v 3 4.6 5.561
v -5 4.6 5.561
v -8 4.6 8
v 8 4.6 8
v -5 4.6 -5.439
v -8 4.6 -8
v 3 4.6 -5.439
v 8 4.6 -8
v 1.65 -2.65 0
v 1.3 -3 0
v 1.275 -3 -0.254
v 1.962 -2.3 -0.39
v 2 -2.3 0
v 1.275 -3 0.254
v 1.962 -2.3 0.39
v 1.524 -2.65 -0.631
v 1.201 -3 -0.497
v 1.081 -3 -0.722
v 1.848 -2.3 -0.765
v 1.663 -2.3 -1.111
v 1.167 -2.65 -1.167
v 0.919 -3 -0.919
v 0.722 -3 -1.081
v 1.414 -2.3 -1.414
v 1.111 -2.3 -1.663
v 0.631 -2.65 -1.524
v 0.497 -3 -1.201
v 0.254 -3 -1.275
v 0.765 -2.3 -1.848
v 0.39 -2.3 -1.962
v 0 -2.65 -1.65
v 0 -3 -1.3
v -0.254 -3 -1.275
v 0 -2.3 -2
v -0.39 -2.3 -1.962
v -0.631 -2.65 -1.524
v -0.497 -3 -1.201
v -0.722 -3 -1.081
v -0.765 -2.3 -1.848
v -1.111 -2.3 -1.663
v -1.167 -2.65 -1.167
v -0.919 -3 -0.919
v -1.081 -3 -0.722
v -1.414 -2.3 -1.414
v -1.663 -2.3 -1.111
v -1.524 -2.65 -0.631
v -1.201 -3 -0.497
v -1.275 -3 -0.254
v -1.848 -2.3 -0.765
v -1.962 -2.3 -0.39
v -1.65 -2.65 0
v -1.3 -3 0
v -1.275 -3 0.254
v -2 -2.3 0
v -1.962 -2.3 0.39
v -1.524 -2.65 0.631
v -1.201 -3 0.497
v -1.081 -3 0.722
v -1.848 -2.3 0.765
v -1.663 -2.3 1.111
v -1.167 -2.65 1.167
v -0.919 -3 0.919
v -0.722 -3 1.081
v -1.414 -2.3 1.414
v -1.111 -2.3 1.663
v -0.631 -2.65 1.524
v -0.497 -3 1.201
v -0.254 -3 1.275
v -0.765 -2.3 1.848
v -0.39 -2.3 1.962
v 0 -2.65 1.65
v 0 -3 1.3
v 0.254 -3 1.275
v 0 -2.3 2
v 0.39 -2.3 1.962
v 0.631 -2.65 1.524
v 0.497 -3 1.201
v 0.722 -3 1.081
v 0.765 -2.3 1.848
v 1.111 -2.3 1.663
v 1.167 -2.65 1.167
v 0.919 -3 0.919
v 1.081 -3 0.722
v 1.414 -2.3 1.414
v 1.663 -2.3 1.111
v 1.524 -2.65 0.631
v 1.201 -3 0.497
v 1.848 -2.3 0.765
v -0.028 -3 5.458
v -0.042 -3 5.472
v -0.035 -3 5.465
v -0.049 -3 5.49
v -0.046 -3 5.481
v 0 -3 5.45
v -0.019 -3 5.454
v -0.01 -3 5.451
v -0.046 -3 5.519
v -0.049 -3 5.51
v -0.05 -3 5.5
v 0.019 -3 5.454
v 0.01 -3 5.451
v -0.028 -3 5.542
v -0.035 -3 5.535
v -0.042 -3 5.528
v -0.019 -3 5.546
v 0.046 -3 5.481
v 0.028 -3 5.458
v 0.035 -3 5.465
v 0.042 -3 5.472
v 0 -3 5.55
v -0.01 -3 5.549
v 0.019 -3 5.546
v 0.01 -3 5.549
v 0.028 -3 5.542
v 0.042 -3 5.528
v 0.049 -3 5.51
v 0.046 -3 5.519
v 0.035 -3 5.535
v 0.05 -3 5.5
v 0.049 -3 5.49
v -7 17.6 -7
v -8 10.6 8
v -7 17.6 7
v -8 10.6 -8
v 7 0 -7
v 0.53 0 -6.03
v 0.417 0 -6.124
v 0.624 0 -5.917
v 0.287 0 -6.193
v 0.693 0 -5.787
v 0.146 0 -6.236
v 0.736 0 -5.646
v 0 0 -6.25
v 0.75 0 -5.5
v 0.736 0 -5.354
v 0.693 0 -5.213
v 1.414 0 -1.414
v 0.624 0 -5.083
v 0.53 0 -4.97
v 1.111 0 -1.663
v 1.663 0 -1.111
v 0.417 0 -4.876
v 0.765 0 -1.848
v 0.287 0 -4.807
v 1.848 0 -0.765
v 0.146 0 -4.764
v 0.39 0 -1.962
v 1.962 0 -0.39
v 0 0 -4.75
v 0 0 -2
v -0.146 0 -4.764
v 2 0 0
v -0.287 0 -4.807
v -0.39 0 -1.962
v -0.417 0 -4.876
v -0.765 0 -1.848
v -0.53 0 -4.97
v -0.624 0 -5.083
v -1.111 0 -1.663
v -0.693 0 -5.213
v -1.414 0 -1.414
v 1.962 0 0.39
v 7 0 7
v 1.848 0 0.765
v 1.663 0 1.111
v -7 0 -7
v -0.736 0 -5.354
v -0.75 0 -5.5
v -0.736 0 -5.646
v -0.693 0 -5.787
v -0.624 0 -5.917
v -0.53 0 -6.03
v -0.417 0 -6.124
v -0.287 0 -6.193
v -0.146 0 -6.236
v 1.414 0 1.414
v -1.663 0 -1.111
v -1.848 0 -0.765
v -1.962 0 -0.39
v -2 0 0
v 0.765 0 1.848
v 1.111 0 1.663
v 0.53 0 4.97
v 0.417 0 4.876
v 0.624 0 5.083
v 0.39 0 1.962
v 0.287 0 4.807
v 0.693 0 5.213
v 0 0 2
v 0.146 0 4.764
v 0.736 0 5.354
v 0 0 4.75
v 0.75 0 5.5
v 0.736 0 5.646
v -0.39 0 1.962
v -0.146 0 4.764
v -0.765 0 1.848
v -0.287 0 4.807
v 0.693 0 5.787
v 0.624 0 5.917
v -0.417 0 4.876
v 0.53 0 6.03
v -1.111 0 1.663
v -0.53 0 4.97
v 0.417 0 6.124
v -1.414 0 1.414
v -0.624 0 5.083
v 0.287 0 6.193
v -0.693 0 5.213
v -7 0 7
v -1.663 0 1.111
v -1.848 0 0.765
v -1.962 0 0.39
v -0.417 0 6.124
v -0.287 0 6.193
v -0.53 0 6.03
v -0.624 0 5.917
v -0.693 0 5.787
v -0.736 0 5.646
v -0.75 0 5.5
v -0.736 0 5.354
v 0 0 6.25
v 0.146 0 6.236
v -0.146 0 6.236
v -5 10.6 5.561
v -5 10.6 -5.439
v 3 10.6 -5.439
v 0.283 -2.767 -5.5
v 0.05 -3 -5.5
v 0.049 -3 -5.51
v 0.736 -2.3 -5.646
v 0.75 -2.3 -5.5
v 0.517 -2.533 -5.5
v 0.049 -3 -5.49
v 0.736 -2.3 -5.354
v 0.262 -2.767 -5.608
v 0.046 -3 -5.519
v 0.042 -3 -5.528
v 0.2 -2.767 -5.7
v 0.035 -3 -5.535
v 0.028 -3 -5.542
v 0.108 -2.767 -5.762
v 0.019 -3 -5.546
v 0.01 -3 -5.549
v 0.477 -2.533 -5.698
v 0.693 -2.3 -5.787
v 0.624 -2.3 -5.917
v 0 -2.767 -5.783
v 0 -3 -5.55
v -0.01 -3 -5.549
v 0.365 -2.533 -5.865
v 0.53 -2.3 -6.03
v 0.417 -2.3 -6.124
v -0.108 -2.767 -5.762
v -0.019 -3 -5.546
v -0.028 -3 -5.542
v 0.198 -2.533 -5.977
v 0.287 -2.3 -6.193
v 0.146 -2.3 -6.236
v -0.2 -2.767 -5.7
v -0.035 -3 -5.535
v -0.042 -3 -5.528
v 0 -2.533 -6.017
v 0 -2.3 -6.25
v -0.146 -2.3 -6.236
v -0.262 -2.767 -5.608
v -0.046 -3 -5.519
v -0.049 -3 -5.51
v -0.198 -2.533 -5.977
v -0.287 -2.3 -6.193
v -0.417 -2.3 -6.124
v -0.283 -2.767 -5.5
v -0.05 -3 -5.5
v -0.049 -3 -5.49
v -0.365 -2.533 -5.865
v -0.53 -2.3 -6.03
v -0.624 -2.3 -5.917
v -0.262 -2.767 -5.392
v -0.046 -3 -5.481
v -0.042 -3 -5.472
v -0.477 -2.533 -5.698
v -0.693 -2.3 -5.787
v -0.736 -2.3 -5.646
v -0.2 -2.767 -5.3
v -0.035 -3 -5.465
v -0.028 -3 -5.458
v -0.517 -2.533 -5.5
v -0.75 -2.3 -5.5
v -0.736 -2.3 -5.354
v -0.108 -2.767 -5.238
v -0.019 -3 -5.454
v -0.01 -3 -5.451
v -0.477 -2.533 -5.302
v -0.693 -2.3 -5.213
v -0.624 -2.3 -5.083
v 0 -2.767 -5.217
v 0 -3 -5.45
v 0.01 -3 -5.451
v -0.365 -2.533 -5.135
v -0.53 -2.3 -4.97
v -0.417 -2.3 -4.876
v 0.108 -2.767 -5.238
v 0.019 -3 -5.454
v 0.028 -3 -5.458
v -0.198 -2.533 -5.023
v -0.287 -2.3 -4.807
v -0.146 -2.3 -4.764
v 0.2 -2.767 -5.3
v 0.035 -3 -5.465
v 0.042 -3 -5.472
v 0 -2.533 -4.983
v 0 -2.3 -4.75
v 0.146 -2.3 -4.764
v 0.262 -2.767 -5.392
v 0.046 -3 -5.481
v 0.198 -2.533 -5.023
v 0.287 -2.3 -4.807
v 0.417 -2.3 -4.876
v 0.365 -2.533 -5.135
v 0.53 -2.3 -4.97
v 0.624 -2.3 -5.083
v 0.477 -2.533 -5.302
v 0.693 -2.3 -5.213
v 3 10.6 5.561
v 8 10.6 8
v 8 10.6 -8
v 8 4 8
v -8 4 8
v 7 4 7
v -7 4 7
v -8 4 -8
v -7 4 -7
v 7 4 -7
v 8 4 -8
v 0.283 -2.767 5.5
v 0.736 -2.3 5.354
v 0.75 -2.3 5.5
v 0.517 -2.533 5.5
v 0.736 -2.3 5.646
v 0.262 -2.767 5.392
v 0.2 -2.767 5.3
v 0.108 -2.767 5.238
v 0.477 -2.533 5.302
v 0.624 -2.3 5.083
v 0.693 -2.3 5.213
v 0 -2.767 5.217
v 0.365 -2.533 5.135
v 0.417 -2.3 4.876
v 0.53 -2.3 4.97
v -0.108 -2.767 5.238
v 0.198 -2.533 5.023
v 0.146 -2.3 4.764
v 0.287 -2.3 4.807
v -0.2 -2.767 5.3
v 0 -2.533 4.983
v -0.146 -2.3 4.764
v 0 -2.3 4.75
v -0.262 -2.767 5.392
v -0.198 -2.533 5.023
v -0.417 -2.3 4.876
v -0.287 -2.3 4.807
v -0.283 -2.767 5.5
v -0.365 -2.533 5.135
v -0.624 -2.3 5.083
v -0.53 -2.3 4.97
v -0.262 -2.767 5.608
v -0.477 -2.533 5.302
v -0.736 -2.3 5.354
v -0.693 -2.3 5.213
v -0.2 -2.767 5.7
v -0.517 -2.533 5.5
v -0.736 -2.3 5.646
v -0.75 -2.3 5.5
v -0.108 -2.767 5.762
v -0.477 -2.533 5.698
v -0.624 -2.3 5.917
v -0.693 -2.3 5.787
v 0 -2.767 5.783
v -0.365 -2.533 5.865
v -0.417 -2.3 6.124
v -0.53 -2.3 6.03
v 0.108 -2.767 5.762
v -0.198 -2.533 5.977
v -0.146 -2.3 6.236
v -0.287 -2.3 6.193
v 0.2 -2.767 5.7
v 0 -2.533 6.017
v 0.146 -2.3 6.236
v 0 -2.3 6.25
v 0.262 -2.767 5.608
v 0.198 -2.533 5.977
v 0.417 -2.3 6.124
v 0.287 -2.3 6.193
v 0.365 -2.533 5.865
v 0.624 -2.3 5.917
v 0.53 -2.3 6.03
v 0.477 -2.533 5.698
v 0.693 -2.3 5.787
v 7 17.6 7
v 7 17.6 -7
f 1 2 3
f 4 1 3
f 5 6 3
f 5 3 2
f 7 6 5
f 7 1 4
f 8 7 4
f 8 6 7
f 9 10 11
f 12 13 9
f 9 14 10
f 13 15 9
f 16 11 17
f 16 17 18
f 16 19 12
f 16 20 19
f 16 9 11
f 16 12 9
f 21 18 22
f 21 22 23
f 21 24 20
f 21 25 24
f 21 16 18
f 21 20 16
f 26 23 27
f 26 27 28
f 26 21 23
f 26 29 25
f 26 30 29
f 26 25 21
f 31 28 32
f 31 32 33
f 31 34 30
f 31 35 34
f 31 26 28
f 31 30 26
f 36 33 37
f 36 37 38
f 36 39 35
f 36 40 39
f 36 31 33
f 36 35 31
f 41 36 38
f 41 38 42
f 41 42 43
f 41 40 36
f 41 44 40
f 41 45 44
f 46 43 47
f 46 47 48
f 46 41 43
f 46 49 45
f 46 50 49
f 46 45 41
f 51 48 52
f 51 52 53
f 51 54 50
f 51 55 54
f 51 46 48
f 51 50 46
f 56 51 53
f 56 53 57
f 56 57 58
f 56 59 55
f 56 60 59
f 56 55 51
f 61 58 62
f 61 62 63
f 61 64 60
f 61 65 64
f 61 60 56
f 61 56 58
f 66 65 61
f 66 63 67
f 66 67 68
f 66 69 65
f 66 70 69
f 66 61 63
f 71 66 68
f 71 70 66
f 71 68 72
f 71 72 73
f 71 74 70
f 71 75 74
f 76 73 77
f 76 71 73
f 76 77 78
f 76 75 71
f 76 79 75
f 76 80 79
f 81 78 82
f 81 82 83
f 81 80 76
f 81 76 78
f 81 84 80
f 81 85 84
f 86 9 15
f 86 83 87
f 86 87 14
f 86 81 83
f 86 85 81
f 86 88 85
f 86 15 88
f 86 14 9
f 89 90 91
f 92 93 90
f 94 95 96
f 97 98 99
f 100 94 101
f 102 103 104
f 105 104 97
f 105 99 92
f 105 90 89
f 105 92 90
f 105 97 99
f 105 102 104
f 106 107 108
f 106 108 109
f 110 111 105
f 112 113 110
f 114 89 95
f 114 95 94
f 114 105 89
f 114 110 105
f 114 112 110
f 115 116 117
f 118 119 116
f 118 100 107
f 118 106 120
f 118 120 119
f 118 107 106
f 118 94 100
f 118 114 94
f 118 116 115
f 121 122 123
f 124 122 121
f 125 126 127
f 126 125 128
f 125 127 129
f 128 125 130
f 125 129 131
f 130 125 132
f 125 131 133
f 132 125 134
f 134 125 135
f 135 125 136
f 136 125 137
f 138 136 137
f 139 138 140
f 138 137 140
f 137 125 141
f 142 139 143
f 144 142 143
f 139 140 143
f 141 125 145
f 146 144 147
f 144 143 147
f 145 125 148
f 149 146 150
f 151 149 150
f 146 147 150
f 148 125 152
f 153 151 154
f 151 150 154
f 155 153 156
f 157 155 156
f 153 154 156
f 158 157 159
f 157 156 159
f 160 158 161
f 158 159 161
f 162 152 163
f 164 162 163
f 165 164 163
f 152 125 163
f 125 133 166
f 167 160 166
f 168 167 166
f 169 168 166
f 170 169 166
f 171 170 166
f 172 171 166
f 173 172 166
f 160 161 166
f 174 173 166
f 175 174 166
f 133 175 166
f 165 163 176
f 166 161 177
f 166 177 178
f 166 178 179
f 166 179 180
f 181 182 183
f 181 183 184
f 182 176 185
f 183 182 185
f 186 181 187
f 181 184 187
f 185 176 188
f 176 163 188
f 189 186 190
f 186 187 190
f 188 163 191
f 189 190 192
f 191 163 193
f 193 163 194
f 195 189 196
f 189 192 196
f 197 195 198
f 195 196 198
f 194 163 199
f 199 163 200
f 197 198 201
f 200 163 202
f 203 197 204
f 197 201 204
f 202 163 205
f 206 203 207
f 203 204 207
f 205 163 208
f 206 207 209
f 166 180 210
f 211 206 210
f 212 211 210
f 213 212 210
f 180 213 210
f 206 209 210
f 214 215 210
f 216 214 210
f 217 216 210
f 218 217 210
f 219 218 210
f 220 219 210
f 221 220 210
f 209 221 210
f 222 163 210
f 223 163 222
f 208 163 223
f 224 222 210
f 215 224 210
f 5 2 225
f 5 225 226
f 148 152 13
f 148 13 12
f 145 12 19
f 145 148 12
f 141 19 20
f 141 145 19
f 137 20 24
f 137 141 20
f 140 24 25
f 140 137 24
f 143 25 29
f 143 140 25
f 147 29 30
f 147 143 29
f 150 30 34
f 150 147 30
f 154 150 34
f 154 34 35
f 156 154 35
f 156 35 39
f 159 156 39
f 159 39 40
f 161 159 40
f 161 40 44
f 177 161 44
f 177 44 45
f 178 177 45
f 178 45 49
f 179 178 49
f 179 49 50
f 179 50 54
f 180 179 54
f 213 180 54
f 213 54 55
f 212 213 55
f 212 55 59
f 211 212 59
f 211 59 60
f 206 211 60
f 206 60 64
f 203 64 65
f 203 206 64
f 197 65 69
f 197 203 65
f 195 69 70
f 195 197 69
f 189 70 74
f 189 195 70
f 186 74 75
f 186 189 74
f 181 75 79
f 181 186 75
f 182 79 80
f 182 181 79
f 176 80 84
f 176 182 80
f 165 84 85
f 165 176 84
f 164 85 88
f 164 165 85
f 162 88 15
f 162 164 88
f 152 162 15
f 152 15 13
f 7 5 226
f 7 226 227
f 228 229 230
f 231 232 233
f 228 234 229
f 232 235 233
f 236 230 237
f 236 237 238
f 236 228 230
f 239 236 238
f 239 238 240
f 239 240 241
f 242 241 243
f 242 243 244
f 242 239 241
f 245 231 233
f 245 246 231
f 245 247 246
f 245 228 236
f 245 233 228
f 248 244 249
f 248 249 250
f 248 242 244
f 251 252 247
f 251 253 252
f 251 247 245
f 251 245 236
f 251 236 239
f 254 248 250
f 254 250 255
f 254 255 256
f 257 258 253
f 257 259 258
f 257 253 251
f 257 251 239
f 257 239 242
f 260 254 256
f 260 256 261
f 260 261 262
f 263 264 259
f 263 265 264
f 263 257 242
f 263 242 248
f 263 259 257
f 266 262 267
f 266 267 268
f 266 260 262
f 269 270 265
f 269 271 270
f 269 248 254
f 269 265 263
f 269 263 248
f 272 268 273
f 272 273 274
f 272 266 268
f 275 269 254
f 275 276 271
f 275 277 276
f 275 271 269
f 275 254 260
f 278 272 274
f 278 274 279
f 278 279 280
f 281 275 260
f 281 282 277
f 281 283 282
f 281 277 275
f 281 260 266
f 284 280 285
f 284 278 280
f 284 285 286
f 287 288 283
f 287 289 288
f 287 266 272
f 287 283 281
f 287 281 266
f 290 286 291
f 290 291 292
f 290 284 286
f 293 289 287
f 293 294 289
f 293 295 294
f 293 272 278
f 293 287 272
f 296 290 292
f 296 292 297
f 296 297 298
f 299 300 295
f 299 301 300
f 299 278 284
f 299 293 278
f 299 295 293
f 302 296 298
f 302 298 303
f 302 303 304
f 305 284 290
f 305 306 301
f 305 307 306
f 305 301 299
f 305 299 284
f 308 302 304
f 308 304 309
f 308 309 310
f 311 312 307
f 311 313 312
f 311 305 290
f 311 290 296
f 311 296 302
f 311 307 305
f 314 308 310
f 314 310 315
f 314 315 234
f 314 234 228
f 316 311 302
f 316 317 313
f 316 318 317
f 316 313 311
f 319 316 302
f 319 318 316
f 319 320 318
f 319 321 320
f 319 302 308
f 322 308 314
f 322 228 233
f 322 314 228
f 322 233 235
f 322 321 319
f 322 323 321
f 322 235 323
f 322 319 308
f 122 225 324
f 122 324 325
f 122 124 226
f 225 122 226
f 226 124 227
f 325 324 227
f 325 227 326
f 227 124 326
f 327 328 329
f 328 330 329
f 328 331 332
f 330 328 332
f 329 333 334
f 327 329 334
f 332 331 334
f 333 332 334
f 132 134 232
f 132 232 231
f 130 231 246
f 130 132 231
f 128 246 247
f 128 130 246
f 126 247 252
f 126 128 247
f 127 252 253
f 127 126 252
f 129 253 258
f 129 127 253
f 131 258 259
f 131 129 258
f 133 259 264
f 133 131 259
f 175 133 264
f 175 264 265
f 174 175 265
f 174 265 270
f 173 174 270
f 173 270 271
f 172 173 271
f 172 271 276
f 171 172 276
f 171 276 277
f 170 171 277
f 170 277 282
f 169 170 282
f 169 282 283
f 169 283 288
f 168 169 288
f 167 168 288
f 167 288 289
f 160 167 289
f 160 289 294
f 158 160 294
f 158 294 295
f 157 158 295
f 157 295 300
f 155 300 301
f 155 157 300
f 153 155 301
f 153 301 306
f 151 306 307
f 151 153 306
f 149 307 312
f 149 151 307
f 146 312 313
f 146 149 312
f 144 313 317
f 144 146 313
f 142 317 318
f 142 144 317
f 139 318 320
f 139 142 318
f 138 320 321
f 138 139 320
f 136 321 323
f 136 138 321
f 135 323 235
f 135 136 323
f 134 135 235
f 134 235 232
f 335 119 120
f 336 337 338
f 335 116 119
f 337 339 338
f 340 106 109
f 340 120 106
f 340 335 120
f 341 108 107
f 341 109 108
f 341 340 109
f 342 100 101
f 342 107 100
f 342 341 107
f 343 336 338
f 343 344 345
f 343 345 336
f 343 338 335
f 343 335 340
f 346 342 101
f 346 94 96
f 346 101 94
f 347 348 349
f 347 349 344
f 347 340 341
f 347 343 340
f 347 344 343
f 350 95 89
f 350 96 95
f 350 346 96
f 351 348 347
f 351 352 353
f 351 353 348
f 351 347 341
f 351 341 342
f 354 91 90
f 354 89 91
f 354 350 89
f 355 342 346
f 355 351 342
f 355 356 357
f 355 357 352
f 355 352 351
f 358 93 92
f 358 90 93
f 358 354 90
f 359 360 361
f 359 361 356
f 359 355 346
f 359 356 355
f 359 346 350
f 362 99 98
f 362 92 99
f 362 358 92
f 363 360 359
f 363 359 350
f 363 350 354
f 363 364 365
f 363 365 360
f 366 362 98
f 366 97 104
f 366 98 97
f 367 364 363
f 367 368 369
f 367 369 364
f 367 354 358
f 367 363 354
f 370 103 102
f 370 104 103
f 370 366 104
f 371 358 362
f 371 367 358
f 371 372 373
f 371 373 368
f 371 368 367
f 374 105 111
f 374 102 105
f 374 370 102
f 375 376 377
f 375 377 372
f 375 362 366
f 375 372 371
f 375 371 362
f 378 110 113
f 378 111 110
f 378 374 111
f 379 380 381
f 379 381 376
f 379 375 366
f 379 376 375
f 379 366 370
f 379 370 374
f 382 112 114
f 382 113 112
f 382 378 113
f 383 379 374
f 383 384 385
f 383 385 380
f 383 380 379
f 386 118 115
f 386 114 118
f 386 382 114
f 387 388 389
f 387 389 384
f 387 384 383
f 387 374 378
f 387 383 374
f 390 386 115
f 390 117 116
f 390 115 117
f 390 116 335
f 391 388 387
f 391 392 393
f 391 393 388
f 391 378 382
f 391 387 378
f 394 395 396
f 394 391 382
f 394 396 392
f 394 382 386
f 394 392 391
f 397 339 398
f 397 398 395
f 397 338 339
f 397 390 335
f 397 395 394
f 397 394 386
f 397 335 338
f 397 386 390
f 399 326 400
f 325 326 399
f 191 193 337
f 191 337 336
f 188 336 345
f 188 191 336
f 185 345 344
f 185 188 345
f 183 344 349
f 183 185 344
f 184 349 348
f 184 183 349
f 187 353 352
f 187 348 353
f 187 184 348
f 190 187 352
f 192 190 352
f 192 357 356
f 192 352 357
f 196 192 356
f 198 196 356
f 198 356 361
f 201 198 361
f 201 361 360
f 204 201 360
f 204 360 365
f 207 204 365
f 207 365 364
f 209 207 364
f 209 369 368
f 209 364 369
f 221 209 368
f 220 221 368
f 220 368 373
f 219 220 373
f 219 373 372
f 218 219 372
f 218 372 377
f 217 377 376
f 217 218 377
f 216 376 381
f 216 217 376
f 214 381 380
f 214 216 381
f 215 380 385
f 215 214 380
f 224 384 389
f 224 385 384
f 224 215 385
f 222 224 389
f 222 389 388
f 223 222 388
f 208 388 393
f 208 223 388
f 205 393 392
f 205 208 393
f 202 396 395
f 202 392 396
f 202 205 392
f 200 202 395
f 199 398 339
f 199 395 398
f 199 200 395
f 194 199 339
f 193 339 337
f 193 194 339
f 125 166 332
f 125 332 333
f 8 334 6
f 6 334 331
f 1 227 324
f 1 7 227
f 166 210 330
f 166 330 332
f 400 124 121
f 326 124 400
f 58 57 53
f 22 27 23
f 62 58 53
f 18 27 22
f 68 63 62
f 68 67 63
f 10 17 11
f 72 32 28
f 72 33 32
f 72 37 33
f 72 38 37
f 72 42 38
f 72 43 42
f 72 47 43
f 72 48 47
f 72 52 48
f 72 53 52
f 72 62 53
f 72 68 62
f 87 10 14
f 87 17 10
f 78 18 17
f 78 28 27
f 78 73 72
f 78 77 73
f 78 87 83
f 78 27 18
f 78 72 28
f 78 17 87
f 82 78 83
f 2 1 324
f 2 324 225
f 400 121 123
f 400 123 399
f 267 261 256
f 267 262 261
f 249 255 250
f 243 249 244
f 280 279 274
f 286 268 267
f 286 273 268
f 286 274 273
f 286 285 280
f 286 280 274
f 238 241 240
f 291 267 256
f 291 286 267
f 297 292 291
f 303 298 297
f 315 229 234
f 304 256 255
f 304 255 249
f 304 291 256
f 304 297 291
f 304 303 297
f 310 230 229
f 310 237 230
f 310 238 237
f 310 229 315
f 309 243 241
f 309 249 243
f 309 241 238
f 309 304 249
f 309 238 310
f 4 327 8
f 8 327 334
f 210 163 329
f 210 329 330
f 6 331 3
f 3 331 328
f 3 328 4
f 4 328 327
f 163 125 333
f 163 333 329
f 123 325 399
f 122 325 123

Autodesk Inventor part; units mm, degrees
ref_plane "YZ Plane" through (0, 0, 0) normal (1, 0, 0) x (0, 1, 0)
ref_plane "XZ Plane" through (0, 0, 0) normal (0, 1, 0) x (-1, 0, 0)
ref_plane "XY Plane" through (0, 0, 0) normal (0, 0, 1) x (1, 0, 0)
sketch "Sketch1" plane through (0, 0, 0) normal (0, 1, 0) x (-1, 0, 0)
  line L0 (-7, 7) -> (7, 7)
  line L1 (7, 7) -> (7, -7)
  line L2 (7, -7) -> (-7, -7)
  line L3 (-7, -7) -> (-7, 7)
  line L4 (-7, 7) -> (7, -7) construction
  line L5 (7, 7) -> (-7, -7) construction
  point P0 (0, 0)
  dimension "d0" = 14
  dimension "d1" = 14
extrude "Extrusion1" add sketch "Sketch1" along normal blind 4
sketch "Sketch2" plane through (0, 4, 0) normal (0, 1, 0) x (1, 0, 0)
  line L0 (8, 8) -> (-8, 8)
  line L1 (-8, 8) -> (-8, -8)
  line L2 (-8, -8) -> (8, -8)
  line L3 (8, -8) -> (8, 8)
  line L4 (8, 8) -> (-8, -8) construction
  line L5 (-8, 8) -> (8, -8) construction
  point P0 (0, 0)
  dimension "d4" = 16
  dimension "d5" = 16
extrude "Extrusion2" add sketch "Sketch2" along normal blind 0.6
sketch "Sketch3" plane through (0, 4.6, 0) normal (0, 1, 0) x (1, 0, 0)
  line L0 (3, -5.5611) -> (-5, -5.5611)
  line L1 (-5, -5.5611) -> (-5, 5.4389)
  line L2 (-5, 5.4389) -> (3, 5.4389)
  line L3 (3, 5.4389) -> (3, -5.5611)
  line L4 (3, -5.5611) -> (-5, 5.4389) construction
  line L5 (-5, -5.5611) -> (3, 5.4389) construction
  point P0 (0, 0)
  point P1 (-1, -0.0611)
  dimension "d8" = 8
  dimension "d9" = 11
extrude "Extrusion3" add sketch "Sketch3" along normal blind 6
sketch "Sketch4" plane through (0, 10.6, 0) normal (0, 1, 0) x (1, 0, 0)
  line L0 (8, -8) -> (-8, -8)
  line L1 (-8, -8) -> (-8, 8)
  line L2 (-8, 8) -> (8, 8)
  line L3 (8, 8) -> (8, -8)
  line L4 (8, -8) -> (-8, 8) construction
  line L5 (-8, -8) -> (8, 8) construction
  point P0 (0, 0)
  dimension "d12" = 16
  dimension "d13" = 16
extrude "Extrusion4" add sketch "Sketch4" along normal blind 7
chamfer "Chamfer1" distance 1 distance2 7 4 edges at (8, 17.6, 0) (0, 17.6, 8) (0, 17.6, -8) (-8, 17.6, 0) measured on face at (-2.6667, 17.6, 2.6667)
sketch "Sketch5" plane through (0, 0, 0) normal (0, -1, 0) x (1, 0, 0)
  circle A0 centre (0, 0) radius 2
  line L0 (-5, -5.4389) -> (3, -5.4389) construction
  line L1 (0, 0) -> (0, -11)
  line L2 (0, 0) -> (4.5527, 0)
  circle A1 centre (0, -5.5) radius 0.75
  circle A2 centre (0, 5.5) radius 0.75
  dimension "d19" = 4
  dimension "d22" = 1.5
  dimension "d23" = 5.5
extrude "Extrusion5" add sketch "Sketch5" along normal blind 3
chamfer "Chamfer2" distance 0.7 angle 45 3 edges at (-2, -3, 0) (-0.75, -3, 5.5) (-0.75, -3, -5.5)
properties part number "switch"
